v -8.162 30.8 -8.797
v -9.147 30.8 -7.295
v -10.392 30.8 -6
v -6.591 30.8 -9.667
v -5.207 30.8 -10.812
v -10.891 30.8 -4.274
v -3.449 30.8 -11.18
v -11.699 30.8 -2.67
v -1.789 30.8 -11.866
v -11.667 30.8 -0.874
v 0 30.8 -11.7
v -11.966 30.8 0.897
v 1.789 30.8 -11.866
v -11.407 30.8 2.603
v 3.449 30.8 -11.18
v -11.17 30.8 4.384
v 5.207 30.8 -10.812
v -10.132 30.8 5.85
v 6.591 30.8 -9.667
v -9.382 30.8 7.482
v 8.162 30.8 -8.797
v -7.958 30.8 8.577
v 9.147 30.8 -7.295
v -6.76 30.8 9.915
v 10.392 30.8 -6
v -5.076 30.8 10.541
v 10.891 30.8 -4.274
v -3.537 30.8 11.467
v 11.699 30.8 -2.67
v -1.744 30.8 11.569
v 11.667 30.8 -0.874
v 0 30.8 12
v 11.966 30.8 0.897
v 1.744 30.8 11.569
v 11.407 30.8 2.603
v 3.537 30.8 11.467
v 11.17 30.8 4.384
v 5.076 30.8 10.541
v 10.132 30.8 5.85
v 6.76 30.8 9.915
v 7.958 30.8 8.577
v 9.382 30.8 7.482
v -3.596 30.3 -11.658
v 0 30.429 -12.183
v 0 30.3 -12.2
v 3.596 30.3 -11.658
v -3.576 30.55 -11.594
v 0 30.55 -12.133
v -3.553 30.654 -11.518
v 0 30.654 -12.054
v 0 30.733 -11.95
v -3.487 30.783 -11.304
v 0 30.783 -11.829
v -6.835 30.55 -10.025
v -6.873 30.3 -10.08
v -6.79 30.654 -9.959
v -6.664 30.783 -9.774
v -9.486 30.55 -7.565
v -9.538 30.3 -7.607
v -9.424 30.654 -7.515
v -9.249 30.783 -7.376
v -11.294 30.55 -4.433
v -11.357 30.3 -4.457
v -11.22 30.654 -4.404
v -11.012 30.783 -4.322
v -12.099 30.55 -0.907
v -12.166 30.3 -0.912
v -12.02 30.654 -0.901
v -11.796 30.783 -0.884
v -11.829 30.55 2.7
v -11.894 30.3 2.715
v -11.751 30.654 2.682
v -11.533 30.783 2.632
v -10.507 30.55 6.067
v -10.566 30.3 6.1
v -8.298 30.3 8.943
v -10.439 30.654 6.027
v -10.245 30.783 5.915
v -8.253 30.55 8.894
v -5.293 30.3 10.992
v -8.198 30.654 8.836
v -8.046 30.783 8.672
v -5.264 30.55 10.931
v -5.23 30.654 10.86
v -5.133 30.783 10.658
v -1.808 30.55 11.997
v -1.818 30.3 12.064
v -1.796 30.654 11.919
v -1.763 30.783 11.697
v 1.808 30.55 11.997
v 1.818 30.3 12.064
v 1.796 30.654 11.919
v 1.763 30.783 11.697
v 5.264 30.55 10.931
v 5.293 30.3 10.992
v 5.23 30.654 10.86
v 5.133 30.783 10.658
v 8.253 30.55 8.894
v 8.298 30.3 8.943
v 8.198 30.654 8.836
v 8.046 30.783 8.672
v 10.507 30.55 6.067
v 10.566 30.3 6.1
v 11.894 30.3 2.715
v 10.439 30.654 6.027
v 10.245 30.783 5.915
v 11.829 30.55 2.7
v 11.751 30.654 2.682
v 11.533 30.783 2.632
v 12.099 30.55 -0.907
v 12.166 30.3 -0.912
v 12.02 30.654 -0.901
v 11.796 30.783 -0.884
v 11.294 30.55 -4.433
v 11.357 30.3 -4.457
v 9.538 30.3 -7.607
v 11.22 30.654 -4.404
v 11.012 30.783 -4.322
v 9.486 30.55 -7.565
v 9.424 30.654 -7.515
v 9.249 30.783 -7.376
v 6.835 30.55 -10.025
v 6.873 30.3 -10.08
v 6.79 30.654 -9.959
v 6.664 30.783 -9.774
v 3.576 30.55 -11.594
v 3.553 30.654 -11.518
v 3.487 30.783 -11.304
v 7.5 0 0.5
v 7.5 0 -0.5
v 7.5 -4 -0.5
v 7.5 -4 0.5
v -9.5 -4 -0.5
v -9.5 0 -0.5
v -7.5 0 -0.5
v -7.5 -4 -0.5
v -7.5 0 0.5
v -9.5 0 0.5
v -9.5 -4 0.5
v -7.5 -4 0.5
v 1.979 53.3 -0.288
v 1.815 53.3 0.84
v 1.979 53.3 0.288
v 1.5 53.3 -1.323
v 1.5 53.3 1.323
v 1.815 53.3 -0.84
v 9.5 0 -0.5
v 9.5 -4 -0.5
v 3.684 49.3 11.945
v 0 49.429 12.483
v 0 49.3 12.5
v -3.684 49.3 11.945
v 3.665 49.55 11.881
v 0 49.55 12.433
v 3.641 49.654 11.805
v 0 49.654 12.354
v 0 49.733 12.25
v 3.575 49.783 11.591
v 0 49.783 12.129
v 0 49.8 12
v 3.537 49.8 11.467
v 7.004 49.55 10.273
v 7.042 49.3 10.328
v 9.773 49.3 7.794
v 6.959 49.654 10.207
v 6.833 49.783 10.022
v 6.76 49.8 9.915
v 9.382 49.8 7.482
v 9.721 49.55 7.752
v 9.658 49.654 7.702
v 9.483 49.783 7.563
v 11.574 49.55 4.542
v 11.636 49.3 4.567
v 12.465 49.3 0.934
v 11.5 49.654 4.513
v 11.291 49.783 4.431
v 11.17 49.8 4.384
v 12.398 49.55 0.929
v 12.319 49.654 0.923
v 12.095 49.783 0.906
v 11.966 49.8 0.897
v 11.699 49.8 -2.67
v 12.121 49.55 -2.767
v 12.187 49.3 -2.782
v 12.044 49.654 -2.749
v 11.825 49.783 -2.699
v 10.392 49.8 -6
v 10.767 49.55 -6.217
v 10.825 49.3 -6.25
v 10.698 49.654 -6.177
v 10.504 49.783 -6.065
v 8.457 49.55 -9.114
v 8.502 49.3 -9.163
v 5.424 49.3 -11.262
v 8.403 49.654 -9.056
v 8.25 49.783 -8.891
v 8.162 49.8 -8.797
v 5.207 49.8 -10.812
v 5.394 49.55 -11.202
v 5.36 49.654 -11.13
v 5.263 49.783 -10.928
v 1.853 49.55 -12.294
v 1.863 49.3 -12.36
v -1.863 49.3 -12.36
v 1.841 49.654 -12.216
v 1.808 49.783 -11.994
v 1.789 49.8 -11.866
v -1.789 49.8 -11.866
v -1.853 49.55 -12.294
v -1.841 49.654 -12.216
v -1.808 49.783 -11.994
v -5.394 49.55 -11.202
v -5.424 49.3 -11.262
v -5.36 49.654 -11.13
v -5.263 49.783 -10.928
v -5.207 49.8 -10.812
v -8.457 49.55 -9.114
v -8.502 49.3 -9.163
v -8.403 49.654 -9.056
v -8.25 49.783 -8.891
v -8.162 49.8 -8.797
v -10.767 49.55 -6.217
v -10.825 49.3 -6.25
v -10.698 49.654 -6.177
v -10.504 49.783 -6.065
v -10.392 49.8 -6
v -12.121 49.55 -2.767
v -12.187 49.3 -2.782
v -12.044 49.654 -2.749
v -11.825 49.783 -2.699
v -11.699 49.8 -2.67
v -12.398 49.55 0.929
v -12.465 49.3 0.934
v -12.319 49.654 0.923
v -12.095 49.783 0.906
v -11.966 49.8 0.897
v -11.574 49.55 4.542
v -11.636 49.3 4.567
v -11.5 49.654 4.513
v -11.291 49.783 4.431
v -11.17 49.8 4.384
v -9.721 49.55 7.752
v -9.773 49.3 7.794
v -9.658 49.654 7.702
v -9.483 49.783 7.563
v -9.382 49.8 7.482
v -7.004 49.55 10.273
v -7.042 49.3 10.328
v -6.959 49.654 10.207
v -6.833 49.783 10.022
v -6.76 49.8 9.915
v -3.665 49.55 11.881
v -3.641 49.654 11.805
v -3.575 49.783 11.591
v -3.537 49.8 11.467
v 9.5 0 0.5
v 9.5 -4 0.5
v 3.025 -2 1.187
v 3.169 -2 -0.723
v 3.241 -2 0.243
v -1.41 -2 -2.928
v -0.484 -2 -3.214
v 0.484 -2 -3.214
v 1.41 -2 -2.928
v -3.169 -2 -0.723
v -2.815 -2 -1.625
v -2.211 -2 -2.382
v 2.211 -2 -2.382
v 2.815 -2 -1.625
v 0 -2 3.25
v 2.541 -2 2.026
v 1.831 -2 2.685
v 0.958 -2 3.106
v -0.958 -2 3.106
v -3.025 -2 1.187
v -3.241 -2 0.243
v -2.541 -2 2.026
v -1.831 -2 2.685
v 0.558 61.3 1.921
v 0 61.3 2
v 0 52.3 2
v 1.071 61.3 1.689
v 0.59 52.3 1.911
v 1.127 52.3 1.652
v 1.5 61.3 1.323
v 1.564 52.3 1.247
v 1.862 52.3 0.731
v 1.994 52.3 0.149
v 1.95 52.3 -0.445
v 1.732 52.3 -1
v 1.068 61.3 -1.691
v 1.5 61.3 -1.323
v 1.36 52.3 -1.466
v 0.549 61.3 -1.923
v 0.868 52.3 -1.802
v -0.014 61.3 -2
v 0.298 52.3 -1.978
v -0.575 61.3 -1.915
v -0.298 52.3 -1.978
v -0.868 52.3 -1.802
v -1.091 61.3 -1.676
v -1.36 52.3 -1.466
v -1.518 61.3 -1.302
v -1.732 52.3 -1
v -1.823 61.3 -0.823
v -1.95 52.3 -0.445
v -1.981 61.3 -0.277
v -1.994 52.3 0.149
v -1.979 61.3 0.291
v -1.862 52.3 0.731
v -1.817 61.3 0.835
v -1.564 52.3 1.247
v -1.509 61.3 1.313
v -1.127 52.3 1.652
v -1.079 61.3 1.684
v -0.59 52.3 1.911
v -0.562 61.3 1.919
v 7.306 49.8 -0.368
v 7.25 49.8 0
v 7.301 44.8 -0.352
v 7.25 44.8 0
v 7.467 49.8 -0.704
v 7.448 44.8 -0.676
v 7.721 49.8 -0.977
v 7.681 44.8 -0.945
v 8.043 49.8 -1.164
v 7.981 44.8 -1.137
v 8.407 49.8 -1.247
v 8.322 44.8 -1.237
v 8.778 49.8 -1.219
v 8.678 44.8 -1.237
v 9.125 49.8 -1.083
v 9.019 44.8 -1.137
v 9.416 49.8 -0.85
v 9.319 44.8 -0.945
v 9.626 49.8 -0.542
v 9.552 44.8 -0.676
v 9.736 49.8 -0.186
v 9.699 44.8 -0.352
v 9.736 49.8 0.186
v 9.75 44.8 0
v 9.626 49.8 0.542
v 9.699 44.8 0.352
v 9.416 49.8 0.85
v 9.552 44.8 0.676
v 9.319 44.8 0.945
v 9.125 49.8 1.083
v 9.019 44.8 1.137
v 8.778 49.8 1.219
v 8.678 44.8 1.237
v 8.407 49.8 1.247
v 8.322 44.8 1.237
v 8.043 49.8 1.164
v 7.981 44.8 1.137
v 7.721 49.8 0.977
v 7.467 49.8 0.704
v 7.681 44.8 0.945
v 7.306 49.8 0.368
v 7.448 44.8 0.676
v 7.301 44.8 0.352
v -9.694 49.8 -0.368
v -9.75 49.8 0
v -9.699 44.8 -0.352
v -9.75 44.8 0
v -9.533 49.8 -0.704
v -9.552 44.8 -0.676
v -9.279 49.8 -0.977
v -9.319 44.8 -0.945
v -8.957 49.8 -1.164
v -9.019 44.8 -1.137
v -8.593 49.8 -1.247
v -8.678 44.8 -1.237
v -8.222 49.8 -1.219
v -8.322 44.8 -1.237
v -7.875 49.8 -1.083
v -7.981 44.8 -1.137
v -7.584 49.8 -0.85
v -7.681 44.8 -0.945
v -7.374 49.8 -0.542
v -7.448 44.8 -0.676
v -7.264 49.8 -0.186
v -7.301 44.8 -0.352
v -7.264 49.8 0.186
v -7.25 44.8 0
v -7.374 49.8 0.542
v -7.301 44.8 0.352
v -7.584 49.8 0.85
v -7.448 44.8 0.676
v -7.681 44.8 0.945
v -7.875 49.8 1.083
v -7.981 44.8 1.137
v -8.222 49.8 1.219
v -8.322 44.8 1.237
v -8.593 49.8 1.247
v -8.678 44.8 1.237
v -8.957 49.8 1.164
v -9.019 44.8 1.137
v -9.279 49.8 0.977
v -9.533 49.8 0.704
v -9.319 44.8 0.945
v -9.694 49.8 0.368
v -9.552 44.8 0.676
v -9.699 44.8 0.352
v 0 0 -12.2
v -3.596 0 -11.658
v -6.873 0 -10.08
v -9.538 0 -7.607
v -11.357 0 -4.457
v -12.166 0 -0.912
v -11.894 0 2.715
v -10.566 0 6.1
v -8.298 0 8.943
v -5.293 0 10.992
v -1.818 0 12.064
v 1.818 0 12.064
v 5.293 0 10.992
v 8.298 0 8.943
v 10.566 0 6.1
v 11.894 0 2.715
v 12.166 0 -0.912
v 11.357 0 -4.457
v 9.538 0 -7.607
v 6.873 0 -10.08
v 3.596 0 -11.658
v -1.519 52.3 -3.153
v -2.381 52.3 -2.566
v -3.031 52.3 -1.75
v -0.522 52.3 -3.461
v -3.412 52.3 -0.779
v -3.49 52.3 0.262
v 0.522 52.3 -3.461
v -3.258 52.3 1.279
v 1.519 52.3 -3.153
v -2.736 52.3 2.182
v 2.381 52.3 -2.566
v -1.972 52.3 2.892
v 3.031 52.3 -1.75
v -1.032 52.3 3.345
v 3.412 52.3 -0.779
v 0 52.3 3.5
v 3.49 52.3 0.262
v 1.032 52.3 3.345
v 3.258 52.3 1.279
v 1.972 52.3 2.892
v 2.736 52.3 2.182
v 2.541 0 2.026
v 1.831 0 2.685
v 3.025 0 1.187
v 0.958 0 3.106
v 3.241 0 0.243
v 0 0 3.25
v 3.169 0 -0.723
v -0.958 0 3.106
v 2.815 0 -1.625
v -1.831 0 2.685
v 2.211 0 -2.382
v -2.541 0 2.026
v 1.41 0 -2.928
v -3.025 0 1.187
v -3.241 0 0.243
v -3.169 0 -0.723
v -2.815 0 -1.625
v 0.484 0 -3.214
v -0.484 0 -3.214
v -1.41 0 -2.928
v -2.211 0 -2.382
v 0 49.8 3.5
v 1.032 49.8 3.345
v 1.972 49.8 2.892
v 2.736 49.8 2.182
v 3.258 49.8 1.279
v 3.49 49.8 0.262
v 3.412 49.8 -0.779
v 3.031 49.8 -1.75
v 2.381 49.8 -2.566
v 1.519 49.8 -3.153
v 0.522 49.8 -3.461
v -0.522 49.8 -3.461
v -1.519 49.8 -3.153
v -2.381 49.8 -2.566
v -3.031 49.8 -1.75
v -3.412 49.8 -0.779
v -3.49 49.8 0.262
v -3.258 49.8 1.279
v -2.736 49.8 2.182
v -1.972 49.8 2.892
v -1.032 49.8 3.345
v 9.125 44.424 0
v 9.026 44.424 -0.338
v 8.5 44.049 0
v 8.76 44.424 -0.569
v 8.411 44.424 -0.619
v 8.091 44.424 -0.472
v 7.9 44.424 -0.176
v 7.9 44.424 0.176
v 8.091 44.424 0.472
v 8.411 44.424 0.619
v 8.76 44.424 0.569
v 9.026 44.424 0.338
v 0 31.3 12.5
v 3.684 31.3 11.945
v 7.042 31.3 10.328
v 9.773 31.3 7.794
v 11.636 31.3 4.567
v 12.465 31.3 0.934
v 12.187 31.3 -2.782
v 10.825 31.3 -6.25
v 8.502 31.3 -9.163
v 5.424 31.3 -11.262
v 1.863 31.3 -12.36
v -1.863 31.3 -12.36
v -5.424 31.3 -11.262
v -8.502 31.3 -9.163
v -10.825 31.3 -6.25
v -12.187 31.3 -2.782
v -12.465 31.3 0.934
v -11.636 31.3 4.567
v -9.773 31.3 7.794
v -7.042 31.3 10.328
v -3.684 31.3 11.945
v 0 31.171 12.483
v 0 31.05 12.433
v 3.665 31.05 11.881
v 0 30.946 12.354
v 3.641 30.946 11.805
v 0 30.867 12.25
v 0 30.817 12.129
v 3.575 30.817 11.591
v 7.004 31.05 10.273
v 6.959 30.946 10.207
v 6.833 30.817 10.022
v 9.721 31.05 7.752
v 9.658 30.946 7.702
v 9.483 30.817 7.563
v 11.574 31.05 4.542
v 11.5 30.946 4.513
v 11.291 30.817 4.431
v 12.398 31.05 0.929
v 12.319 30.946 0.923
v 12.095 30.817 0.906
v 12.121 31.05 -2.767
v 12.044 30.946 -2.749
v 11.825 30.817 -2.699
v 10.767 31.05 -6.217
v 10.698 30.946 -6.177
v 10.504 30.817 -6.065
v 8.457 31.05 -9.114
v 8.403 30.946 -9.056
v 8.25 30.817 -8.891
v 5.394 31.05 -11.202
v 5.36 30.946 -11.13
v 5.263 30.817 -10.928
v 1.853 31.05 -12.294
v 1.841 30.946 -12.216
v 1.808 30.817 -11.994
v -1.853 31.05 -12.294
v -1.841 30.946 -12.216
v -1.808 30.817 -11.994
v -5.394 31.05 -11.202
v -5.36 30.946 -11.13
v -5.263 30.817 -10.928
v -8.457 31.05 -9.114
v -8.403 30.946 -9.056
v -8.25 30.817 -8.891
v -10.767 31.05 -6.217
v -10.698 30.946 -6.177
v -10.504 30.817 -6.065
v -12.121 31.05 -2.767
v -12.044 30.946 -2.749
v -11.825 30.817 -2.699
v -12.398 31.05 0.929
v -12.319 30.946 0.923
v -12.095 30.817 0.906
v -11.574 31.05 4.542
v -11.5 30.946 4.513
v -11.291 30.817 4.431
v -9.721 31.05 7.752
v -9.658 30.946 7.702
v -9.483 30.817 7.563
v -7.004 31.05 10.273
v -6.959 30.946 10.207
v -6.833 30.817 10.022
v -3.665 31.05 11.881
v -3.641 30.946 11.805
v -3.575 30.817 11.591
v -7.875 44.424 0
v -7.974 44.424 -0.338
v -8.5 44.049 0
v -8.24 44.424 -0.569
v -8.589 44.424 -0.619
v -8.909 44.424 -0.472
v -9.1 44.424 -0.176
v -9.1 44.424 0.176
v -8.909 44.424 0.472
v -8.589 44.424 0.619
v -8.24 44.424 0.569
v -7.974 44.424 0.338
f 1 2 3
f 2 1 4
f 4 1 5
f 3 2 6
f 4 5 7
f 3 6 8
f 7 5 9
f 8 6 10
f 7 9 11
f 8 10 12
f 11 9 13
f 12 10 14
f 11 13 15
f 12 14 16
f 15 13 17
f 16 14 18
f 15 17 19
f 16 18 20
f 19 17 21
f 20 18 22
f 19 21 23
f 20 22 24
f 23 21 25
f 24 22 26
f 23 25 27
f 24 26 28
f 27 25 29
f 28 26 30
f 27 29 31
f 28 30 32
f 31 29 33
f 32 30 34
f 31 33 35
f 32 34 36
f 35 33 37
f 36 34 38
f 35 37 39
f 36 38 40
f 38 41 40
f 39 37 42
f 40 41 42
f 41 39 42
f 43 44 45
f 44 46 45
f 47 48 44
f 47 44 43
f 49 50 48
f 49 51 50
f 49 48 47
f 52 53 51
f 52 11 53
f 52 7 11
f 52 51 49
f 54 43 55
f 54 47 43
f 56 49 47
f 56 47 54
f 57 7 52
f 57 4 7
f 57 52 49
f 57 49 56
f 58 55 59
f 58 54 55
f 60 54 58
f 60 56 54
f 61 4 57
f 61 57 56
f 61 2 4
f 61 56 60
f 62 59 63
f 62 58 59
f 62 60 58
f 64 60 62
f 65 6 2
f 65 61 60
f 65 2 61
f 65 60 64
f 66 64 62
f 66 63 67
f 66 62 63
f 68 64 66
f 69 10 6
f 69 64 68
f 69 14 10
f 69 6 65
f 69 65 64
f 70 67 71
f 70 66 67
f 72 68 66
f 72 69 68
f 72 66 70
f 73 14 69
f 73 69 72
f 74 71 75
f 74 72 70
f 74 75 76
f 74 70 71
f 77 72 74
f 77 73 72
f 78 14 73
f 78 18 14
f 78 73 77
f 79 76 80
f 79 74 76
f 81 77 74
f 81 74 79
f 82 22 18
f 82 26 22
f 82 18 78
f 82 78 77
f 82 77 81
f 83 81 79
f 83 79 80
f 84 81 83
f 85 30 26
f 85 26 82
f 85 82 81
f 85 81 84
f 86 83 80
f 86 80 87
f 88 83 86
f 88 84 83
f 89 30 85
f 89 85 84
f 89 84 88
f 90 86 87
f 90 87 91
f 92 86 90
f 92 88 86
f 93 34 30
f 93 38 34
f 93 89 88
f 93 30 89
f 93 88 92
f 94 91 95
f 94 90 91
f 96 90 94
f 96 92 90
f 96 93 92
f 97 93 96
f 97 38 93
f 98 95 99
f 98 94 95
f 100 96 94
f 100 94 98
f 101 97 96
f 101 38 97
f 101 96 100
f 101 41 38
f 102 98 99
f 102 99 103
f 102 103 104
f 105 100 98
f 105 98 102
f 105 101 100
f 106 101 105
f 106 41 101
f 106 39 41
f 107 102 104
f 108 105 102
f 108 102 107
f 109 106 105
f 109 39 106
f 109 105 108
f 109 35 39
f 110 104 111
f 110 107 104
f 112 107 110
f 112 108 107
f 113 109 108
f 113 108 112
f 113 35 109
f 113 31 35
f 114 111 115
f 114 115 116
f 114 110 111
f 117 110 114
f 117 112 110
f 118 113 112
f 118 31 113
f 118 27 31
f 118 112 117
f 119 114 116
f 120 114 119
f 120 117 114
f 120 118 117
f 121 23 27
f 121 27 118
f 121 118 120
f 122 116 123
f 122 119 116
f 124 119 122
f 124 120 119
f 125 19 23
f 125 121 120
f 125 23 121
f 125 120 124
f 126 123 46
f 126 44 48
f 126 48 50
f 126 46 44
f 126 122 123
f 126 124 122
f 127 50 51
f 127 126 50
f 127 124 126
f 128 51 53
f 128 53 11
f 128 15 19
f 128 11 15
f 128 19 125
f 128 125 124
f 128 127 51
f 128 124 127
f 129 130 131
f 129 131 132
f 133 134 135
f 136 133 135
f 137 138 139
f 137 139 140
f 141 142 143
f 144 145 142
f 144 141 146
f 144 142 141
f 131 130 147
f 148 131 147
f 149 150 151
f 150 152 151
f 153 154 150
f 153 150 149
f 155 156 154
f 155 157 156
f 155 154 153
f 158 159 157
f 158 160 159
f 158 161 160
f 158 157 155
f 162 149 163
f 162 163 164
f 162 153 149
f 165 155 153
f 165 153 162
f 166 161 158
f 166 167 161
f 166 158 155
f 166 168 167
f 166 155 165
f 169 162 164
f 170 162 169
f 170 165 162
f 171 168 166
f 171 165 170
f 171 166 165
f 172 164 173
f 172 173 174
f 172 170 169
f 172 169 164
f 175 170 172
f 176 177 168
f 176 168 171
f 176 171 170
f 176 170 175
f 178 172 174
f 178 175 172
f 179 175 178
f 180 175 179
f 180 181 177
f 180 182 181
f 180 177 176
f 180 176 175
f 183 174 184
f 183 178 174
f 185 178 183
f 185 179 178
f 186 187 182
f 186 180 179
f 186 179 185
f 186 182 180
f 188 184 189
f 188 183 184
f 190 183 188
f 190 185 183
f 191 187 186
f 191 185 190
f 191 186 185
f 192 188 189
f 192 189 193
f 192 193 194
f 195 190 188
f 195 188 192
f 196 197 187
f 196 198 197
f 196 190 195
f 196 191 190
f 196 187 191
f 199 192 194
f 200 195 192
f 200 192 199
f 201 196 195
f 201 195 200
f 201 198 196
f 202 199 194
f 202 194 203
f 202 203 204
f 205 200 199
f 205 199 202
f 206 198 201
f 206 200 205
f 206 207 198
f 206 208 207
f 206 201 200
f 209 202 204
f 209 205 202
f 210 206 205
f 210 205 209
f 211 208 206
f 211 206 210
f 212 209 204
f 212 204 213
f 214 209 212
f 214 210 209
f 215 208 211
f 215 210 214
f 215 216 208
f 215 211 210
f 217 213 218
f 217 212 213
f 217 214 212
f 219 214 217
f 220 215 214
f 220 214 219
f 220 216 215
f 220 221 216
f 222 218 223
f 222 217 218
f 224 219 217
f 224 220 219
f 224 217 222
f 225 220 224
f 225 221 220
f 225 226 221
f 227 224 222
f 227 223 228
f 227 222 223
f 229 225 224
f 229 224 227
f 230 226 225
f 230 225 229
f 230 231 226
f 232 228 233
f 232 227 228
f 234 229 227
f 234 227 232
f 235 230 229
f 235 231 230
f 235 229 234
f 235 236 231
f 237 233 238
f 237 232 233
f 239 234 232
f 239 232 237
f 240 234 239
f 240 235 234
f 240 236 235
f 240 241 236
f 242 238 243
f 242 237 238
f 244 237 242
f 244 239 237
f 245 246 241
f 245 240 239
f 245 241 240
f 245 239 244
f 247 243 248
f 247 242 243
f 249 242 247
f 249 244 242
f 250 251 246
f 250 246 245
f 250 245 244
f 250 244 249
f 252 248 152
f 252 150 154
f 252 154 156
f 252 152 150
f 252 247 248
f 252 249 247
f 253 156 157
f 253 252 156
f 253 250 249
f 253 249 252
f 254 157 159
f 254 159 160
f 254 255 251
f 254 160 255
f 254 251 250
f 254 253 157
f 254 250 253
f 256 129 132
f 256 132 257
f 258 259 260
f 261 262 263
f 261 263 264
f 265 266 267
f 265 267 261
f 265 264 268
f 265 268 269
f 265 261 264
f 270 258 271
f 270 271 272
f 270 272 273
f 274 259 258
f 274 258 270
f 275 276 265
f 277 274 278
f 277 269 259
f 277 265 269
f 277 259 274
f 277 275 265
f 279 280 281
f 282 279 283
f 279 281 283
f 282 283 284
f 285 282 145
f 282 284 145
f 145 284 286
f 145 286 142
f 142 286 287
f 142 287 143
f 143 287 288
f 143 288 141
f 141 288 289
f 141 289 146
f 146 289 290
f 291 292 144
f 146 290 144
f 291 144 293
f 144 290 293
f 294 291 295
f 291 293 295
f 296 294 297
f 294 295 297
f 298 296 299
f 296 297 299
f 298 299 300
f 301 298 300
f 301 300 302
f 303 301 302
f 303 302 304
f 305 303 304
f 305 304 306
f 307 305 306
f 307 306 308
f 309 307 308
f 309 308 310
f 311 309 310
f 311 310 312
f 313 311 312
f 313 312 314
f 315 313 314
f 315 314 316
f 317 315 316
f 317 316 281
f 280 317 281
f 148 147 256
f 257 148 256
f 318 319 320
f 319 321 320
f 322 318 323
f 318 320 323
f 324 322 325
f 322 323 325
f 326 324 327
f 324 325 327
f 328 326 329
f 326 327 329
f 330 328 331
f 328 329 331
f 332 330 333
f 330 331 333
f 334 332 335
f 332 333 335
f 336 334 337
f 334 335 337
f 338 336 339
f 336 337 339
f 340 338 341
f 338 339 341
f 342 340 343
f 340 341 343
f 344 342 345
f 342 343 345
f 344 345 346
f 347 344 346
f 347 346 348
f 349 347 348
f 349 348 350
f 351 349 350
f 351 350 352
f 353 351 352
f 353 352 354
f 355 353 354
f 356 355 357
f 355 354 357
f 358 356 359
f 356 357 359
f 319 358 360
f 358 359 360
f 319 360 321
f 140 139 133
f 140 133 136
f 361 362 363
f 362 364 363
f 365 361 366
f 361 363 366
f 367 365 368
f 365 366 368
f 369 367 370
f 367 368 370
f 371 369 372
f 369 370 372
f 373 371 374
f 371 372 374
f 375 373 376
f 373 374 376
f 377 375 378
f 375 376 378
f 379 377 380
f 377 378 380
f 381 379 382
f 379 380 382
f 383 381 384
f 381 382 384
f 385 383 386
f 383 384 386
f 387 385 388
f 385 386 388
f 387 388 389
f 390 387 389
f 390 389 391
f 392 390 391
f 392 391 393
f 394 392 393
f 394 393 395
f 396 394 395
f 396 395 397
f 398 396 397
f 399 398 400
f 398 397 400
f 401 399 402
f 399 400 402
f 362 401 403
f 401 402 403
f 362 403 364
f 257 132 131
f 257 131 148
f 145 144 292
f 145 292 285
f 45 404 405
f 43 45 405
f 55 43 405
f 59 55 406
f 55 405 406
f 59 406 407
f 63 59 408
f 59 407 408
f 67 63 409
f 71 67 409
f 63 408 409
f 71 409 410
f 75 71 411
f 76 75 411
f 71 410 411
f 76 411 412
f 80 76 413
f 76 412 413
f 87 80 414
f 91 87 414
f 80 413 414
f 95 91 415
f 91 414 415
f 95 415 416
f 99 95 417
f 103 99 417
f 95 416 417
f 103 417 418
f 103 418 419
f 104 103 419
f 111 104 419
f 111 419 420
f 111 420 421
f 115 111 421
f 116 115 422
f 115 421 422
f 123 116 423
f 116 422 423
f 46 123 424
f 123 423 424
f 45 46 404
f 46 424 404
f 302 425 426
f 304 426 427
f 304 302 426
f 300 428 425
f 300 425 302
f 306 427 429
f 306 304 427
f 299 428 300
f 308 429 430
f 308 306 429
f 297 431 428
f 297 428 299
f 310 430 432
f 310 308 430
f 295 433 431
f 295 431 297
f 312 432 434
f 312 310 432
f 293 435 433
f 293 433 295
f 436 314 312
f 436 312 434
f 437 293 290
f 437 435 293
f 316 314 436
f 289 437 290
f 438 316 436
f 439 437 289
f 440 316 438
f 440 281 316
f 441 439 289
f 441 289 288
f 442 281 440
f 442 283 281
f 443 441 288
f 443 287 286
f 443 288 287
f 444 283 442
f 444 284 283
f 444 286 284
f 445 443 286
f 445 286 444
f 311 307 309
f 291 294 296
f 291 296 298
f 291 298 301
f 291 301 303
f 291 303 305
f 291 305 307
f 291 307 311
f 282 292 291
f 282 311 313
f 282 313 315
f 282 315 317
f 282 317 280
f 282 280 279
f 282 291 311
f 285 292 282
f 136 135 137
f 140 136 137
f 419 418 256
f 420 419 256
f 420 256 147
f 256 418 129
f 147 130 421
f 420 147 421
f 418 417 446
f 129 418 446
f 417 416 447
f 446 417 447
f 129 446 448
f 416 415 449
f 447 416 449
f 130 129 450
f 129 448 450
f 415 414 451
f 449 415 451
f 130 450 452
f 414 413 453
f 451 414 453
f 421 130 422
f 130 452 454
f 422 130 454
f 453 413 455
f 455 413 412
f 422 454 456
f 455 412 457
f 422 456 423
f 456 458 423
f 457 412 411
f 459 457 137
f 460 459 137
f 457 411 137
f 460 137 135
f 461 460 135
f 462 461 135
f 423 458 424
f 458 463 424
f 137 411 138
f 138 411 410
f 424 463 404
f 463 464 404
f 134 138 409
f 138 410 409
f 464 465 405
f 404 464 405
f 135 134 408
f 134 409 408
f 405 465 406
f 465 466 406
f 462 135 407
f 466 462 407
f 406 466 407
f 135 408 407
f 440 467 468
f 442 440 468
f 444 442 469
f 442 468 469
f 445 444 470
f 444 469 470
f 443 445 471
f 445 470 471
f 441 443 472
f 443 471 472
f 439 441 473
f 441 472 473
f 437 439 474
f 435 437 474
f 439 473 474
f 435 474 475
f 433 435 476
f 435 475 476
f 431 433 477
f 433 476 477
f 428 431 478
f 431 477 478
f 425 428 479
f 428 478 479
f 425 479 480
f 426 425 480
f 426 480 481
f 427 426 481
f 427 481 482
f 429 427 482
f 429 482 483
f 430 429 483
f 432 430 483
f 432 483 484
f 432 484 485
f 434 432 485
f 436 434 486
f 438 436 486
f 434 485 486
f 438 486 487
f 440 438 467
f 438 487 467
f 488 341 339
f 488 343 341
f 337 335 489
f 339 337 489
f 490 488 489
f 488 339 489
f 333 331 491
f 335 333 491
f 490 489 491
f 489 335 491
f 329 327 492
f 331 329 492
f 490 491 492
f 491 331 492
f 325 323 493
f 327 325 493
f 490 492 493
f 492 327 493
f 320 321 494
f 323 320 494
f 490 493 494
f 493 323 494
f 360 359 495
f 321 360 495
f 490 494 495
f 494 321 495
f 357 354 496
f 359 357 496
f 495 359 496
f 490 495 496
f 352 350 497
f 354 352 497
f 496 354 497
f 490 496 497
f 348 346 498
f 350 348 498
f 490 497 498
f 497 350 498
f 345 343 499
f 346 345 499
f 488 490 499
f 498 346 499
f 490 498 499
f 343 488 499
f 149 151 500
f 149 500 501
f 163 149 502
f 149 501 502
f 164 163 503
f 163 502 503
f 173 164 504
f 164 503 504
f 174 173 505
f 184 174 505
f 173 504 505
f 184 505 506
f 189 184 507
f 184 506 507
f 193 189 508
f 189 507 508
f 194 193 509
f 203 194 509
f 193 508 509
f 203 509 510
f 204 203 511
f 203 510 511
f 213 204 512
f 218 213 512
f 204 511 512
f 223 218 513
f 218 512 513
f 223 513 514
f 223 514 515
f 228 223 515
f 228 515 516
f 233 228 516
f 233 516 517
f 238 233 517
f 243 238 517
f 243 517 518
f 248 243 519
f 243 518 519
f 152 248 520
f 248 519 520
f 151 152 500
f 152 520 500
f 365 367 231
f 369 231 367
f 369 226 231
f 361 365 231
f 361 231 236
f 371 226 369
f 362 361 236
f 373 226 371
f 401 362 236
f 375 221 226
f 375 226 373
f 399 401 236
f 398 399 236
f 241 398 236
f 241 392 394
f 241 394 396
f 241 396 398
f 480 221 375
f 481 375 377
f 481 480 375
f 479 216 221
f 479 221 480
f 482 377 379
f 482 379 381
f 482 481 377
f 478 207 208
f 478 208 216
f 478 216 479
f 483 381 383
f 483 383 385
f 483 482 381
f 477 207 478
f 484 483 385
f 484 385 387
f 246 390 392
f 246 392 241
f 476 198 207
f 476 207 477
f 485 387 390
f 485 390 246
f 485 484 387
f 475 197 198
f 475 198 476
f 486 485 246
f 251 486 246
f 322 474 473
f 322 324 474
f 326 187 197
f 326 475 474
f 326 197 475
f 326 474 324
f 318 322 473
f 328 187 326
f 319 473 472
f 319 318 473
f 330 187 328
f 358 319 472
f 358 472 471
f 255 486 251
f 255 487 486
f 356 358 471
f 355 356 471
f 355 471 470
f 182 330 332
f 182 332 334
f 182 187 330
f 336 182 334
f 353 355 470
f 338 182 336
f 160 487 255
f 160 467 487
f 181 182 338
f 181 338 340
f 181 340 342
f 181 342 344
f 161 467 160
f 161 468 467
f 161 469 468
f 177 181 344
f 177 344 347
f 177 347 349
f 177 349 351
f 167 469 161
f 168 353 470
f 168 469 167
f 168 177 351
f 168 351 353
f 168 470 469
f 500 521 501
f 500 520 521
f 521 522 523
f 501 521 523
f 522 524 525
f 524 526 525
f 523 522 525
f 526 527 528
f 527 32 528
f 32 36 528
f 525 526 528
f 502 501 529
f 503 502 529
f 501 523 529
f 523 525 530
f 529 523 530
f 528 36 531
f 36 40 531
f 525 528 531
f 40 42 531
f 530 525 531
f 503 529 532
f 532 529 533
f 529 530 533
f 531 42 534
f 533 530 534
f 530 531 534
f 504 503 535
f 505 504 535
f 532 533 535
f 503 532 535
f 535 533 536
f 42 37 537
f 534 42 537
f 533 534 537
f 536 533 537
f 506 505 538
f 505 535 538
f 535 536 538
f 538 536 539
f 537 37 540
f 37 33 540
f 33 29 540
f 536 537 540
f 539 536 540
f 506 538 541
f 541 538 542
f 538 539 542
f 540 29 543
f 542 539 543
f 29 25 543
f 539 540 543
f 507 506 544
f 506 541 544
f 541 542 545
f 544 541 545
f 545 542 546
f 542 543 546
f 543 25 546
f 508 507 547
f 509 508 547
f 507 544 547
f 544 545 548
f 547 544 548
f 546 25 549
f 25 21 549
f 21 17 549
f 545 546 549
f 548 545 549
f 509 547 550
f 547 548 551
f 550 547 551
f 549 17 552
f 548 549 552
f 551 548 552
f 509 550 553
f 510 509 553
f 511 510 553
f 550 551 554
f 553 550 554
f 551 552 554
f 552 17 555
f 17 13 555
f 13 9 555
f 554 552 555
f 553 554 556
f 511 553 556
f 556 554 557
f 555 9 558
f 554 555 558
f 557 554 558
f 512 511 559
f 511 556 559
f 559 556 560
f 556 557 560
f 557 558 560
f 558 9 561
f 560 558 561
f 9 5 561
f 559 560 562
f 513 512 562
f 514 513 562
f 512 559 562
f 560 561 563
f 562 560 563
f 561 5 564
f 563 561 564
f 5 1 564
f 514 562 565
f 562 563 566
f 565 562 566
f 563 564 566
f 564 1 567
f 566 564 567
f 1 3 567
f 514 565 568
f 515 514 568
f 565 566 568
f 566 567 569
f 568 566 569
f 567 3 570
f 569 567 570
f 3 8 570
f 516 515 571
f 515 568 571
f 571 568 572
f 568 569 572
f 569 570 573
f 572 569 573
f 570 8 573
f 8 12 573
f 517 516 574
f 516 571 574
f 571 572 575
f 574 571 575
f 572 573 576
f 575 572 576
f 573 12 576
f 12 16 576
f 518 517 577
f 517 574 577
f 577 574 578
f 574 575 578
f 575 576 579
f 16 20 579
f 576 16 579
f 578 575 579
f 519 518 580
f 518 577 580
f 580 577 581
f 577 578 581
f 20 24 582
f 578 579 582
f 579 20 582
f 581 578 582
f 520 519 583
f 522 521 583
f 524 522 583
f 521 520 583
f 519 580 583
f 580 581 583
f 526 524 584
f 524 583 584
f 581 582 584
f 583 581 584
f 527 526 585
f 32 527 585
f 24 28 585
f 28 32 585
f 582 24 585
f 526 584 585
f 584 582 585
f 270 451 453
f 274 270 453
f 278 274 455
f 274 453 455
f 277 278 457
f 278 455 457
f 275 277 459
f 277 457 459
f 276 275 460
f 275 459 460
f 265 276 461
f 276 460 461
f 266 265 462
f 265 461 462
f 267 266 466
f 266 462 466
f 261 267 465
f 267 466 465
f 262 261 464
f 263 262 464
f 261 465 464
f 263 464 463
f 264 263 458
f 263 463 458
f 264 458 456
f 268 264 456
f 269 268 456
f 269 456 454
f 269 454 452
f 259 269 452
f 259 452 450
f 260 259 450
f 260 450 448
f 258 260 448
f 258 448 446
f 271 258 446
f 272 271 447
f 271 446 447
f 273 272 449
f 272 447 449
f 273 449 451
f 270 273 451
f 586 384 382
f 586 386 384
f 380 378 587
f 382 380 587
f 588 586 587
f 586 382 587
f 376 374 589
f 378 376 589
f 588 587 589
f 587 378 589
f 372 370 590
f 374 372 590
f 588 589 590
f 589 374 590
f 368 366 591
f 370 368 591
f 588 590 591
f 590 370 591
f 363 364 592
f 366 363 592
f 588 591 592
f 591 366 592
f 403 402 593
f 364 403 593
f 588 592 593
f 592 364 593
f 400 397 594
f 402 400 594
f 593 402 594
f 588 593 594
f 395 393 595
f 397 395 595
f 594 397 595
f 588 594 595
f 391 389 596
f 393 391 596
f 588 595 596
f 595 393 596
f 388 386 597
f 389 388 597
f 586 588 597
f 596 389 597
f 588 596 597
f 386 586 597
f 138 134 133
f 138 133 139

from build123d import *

# Parameters (mm, degrees)
SKETCH1_R                 = 12.2
BOSS_EXTRUDE1_DEPTH       = 30.8
FILLET1_R                 = 0.5
SKETCH2_R                 = 12.5
BOSS_EXTRUDE2_DEPTH       = 19
SKETCH3_R                 = 3.5
BOSS_EXTRUDE3_DEPTH       = 2.5
SKETCH4_R                 = 2
BOSS_EXTRUDE4_DEPTH       = 9
CUT_EXTRUDE1_START        = -8
CUT_EXTRUDE1_DEPTH        = 8
FILLET2_R                 = 0.5
M3X0_5_TAPPED_HOLE1_D     = 2.5
M3X0_5_TAPPED_HOLE1_DEPTH = 5
M3X0_5_TAPPED_HOLE1_TIP   = 0.751075774
SKETCH10_W                = 2
SKETCH10_H                = 1
BOSS_EXTRUDE5_DEPTH       = 4
SKETCH11_R                = 3.25
BOSS_EXTRUDE6_DEPTH       = 2


with BuildPart() as part:
    # Sketch1 → Boss-Extrude1 (new body)
    with BuildSketch(Plane(origin=(0, 0, 0), x_dir=(1, 0, 0), z_dir=(0, 1, 0))):
        Circle(SKETCH1_R)
    extrude(amount=BOSS_EXTRUDE1_DEPTH)

    # Fillet1
    fillet1_edges = [part.edges().sort_by_distance(p)[0] for p in [
        (-12.2, 30.8, 0),
    ]]
    fillet(fillet1_edges, radius=FILLET1_R)

    # Sketch2 → Boss-Extrude2 (add)
    with BuildSketch(Plane(origin=(0, 30.8, 0), x_dir=(1, 0, 0), z_dir=(0, 1, 0))):
        Circle(SKETCH2_R)
    extrude(amount=BOSS_EXTRUDE2_DEPTH)

    # Sketch3 → Boss-Extrude3 (add)
    with BuildSketch(Plane(origin=(0, 49.8, 0), x_dir=(1, 0, 0), z_dir=(0, 1, 0))):
        Circle(SKETCH3_R)
    extrude(amount=BOSS_EXTRUDE3_DEPTH)

    # Sketch4 → Boss-Extrude4 (add)
    with BuildSketch(Plane(origin=(0, 52.3, 0), x_dir=(1, 0, 0), z_dir=(0, 1, 0))):
        Circle(SKETCH4_R)
    extrude(amount=BOSS_EXTRUDE4_DEPTH)

    # Sketch5 → Cut-Extrude1 (cut)
    with BuildSketch(Plane(origin=(0, 61.3, 0), x_dir=(1, 0, 0), z_dir=(0, 1, 0)).offset(CUT_EXTRUDE1_START)):
        with BuildLine():
            Line((1.5, 1.322875656), (1.5, -1.322875656))
            ThreePointArc((1.5, -1.322875656), (2, 0), (1.5, 1.322875656))
        make_face()
    extrude(amount=CUT_EXTRUDE1_DEPTH, mode=Mode.SUBTRACT)

    # Fillet2
    fillet2_edges = [part.edges().sort_by_distance(p)[0] for p in [
        (-12.5, 49.8, 0),
        (-12.5, 30.8, 0),
    ]]
    fillet(fillet2_edges, radius=FILLET2_R)

    # M3x0.5 Tapped Hole1
    with Locations(Plane(origin=(0, 49.8, 0), x_dir=(1, 0, 0), z_dir=(0, 1, 0))):
        with Locations((-8.5, 0), (8.5, 0)):
            Hole(M3X0_5_TAPPED_HOLE1_D / 2, depth=M3X0_5_TAPPED_HOLE1_DEPTH)
            with Locations((0, 0, -(M3X0_5_TAPPED_HOLE1_DEPTH + M3X0_5_TAPPED_HOLE1_TIP / 2))):  # 118° drill point
                Cone(0, M3X0_5_TAPPED_HOLE1_D / 2, M3X0_5_TAPPED_HOLE1_TIP, mode=Mode.SUBTRACT)

    # Sketch10 → Boss-Extrude5 (add)
    with BuildSketch(Plane.XZ):
        with Locations((-8.5, 0)):
            Rectangle(SKETCH10_W, SKETCH10_H)
        with Locations((8.5, 0)):
            Rectangle(SKETCH10_W, SKETCH10_H)
    extrude(amount=BOSS_EXTRUDE5_DEPTH)

    # Sketch11 → Boss-Extrude6 (add)
    with BuildSketch(Plane.XZ):
        Circle(SKETCH11_R)
    extrude(amount=BOSS_EXTRUDE6_DEPTH)


solid = part.part
